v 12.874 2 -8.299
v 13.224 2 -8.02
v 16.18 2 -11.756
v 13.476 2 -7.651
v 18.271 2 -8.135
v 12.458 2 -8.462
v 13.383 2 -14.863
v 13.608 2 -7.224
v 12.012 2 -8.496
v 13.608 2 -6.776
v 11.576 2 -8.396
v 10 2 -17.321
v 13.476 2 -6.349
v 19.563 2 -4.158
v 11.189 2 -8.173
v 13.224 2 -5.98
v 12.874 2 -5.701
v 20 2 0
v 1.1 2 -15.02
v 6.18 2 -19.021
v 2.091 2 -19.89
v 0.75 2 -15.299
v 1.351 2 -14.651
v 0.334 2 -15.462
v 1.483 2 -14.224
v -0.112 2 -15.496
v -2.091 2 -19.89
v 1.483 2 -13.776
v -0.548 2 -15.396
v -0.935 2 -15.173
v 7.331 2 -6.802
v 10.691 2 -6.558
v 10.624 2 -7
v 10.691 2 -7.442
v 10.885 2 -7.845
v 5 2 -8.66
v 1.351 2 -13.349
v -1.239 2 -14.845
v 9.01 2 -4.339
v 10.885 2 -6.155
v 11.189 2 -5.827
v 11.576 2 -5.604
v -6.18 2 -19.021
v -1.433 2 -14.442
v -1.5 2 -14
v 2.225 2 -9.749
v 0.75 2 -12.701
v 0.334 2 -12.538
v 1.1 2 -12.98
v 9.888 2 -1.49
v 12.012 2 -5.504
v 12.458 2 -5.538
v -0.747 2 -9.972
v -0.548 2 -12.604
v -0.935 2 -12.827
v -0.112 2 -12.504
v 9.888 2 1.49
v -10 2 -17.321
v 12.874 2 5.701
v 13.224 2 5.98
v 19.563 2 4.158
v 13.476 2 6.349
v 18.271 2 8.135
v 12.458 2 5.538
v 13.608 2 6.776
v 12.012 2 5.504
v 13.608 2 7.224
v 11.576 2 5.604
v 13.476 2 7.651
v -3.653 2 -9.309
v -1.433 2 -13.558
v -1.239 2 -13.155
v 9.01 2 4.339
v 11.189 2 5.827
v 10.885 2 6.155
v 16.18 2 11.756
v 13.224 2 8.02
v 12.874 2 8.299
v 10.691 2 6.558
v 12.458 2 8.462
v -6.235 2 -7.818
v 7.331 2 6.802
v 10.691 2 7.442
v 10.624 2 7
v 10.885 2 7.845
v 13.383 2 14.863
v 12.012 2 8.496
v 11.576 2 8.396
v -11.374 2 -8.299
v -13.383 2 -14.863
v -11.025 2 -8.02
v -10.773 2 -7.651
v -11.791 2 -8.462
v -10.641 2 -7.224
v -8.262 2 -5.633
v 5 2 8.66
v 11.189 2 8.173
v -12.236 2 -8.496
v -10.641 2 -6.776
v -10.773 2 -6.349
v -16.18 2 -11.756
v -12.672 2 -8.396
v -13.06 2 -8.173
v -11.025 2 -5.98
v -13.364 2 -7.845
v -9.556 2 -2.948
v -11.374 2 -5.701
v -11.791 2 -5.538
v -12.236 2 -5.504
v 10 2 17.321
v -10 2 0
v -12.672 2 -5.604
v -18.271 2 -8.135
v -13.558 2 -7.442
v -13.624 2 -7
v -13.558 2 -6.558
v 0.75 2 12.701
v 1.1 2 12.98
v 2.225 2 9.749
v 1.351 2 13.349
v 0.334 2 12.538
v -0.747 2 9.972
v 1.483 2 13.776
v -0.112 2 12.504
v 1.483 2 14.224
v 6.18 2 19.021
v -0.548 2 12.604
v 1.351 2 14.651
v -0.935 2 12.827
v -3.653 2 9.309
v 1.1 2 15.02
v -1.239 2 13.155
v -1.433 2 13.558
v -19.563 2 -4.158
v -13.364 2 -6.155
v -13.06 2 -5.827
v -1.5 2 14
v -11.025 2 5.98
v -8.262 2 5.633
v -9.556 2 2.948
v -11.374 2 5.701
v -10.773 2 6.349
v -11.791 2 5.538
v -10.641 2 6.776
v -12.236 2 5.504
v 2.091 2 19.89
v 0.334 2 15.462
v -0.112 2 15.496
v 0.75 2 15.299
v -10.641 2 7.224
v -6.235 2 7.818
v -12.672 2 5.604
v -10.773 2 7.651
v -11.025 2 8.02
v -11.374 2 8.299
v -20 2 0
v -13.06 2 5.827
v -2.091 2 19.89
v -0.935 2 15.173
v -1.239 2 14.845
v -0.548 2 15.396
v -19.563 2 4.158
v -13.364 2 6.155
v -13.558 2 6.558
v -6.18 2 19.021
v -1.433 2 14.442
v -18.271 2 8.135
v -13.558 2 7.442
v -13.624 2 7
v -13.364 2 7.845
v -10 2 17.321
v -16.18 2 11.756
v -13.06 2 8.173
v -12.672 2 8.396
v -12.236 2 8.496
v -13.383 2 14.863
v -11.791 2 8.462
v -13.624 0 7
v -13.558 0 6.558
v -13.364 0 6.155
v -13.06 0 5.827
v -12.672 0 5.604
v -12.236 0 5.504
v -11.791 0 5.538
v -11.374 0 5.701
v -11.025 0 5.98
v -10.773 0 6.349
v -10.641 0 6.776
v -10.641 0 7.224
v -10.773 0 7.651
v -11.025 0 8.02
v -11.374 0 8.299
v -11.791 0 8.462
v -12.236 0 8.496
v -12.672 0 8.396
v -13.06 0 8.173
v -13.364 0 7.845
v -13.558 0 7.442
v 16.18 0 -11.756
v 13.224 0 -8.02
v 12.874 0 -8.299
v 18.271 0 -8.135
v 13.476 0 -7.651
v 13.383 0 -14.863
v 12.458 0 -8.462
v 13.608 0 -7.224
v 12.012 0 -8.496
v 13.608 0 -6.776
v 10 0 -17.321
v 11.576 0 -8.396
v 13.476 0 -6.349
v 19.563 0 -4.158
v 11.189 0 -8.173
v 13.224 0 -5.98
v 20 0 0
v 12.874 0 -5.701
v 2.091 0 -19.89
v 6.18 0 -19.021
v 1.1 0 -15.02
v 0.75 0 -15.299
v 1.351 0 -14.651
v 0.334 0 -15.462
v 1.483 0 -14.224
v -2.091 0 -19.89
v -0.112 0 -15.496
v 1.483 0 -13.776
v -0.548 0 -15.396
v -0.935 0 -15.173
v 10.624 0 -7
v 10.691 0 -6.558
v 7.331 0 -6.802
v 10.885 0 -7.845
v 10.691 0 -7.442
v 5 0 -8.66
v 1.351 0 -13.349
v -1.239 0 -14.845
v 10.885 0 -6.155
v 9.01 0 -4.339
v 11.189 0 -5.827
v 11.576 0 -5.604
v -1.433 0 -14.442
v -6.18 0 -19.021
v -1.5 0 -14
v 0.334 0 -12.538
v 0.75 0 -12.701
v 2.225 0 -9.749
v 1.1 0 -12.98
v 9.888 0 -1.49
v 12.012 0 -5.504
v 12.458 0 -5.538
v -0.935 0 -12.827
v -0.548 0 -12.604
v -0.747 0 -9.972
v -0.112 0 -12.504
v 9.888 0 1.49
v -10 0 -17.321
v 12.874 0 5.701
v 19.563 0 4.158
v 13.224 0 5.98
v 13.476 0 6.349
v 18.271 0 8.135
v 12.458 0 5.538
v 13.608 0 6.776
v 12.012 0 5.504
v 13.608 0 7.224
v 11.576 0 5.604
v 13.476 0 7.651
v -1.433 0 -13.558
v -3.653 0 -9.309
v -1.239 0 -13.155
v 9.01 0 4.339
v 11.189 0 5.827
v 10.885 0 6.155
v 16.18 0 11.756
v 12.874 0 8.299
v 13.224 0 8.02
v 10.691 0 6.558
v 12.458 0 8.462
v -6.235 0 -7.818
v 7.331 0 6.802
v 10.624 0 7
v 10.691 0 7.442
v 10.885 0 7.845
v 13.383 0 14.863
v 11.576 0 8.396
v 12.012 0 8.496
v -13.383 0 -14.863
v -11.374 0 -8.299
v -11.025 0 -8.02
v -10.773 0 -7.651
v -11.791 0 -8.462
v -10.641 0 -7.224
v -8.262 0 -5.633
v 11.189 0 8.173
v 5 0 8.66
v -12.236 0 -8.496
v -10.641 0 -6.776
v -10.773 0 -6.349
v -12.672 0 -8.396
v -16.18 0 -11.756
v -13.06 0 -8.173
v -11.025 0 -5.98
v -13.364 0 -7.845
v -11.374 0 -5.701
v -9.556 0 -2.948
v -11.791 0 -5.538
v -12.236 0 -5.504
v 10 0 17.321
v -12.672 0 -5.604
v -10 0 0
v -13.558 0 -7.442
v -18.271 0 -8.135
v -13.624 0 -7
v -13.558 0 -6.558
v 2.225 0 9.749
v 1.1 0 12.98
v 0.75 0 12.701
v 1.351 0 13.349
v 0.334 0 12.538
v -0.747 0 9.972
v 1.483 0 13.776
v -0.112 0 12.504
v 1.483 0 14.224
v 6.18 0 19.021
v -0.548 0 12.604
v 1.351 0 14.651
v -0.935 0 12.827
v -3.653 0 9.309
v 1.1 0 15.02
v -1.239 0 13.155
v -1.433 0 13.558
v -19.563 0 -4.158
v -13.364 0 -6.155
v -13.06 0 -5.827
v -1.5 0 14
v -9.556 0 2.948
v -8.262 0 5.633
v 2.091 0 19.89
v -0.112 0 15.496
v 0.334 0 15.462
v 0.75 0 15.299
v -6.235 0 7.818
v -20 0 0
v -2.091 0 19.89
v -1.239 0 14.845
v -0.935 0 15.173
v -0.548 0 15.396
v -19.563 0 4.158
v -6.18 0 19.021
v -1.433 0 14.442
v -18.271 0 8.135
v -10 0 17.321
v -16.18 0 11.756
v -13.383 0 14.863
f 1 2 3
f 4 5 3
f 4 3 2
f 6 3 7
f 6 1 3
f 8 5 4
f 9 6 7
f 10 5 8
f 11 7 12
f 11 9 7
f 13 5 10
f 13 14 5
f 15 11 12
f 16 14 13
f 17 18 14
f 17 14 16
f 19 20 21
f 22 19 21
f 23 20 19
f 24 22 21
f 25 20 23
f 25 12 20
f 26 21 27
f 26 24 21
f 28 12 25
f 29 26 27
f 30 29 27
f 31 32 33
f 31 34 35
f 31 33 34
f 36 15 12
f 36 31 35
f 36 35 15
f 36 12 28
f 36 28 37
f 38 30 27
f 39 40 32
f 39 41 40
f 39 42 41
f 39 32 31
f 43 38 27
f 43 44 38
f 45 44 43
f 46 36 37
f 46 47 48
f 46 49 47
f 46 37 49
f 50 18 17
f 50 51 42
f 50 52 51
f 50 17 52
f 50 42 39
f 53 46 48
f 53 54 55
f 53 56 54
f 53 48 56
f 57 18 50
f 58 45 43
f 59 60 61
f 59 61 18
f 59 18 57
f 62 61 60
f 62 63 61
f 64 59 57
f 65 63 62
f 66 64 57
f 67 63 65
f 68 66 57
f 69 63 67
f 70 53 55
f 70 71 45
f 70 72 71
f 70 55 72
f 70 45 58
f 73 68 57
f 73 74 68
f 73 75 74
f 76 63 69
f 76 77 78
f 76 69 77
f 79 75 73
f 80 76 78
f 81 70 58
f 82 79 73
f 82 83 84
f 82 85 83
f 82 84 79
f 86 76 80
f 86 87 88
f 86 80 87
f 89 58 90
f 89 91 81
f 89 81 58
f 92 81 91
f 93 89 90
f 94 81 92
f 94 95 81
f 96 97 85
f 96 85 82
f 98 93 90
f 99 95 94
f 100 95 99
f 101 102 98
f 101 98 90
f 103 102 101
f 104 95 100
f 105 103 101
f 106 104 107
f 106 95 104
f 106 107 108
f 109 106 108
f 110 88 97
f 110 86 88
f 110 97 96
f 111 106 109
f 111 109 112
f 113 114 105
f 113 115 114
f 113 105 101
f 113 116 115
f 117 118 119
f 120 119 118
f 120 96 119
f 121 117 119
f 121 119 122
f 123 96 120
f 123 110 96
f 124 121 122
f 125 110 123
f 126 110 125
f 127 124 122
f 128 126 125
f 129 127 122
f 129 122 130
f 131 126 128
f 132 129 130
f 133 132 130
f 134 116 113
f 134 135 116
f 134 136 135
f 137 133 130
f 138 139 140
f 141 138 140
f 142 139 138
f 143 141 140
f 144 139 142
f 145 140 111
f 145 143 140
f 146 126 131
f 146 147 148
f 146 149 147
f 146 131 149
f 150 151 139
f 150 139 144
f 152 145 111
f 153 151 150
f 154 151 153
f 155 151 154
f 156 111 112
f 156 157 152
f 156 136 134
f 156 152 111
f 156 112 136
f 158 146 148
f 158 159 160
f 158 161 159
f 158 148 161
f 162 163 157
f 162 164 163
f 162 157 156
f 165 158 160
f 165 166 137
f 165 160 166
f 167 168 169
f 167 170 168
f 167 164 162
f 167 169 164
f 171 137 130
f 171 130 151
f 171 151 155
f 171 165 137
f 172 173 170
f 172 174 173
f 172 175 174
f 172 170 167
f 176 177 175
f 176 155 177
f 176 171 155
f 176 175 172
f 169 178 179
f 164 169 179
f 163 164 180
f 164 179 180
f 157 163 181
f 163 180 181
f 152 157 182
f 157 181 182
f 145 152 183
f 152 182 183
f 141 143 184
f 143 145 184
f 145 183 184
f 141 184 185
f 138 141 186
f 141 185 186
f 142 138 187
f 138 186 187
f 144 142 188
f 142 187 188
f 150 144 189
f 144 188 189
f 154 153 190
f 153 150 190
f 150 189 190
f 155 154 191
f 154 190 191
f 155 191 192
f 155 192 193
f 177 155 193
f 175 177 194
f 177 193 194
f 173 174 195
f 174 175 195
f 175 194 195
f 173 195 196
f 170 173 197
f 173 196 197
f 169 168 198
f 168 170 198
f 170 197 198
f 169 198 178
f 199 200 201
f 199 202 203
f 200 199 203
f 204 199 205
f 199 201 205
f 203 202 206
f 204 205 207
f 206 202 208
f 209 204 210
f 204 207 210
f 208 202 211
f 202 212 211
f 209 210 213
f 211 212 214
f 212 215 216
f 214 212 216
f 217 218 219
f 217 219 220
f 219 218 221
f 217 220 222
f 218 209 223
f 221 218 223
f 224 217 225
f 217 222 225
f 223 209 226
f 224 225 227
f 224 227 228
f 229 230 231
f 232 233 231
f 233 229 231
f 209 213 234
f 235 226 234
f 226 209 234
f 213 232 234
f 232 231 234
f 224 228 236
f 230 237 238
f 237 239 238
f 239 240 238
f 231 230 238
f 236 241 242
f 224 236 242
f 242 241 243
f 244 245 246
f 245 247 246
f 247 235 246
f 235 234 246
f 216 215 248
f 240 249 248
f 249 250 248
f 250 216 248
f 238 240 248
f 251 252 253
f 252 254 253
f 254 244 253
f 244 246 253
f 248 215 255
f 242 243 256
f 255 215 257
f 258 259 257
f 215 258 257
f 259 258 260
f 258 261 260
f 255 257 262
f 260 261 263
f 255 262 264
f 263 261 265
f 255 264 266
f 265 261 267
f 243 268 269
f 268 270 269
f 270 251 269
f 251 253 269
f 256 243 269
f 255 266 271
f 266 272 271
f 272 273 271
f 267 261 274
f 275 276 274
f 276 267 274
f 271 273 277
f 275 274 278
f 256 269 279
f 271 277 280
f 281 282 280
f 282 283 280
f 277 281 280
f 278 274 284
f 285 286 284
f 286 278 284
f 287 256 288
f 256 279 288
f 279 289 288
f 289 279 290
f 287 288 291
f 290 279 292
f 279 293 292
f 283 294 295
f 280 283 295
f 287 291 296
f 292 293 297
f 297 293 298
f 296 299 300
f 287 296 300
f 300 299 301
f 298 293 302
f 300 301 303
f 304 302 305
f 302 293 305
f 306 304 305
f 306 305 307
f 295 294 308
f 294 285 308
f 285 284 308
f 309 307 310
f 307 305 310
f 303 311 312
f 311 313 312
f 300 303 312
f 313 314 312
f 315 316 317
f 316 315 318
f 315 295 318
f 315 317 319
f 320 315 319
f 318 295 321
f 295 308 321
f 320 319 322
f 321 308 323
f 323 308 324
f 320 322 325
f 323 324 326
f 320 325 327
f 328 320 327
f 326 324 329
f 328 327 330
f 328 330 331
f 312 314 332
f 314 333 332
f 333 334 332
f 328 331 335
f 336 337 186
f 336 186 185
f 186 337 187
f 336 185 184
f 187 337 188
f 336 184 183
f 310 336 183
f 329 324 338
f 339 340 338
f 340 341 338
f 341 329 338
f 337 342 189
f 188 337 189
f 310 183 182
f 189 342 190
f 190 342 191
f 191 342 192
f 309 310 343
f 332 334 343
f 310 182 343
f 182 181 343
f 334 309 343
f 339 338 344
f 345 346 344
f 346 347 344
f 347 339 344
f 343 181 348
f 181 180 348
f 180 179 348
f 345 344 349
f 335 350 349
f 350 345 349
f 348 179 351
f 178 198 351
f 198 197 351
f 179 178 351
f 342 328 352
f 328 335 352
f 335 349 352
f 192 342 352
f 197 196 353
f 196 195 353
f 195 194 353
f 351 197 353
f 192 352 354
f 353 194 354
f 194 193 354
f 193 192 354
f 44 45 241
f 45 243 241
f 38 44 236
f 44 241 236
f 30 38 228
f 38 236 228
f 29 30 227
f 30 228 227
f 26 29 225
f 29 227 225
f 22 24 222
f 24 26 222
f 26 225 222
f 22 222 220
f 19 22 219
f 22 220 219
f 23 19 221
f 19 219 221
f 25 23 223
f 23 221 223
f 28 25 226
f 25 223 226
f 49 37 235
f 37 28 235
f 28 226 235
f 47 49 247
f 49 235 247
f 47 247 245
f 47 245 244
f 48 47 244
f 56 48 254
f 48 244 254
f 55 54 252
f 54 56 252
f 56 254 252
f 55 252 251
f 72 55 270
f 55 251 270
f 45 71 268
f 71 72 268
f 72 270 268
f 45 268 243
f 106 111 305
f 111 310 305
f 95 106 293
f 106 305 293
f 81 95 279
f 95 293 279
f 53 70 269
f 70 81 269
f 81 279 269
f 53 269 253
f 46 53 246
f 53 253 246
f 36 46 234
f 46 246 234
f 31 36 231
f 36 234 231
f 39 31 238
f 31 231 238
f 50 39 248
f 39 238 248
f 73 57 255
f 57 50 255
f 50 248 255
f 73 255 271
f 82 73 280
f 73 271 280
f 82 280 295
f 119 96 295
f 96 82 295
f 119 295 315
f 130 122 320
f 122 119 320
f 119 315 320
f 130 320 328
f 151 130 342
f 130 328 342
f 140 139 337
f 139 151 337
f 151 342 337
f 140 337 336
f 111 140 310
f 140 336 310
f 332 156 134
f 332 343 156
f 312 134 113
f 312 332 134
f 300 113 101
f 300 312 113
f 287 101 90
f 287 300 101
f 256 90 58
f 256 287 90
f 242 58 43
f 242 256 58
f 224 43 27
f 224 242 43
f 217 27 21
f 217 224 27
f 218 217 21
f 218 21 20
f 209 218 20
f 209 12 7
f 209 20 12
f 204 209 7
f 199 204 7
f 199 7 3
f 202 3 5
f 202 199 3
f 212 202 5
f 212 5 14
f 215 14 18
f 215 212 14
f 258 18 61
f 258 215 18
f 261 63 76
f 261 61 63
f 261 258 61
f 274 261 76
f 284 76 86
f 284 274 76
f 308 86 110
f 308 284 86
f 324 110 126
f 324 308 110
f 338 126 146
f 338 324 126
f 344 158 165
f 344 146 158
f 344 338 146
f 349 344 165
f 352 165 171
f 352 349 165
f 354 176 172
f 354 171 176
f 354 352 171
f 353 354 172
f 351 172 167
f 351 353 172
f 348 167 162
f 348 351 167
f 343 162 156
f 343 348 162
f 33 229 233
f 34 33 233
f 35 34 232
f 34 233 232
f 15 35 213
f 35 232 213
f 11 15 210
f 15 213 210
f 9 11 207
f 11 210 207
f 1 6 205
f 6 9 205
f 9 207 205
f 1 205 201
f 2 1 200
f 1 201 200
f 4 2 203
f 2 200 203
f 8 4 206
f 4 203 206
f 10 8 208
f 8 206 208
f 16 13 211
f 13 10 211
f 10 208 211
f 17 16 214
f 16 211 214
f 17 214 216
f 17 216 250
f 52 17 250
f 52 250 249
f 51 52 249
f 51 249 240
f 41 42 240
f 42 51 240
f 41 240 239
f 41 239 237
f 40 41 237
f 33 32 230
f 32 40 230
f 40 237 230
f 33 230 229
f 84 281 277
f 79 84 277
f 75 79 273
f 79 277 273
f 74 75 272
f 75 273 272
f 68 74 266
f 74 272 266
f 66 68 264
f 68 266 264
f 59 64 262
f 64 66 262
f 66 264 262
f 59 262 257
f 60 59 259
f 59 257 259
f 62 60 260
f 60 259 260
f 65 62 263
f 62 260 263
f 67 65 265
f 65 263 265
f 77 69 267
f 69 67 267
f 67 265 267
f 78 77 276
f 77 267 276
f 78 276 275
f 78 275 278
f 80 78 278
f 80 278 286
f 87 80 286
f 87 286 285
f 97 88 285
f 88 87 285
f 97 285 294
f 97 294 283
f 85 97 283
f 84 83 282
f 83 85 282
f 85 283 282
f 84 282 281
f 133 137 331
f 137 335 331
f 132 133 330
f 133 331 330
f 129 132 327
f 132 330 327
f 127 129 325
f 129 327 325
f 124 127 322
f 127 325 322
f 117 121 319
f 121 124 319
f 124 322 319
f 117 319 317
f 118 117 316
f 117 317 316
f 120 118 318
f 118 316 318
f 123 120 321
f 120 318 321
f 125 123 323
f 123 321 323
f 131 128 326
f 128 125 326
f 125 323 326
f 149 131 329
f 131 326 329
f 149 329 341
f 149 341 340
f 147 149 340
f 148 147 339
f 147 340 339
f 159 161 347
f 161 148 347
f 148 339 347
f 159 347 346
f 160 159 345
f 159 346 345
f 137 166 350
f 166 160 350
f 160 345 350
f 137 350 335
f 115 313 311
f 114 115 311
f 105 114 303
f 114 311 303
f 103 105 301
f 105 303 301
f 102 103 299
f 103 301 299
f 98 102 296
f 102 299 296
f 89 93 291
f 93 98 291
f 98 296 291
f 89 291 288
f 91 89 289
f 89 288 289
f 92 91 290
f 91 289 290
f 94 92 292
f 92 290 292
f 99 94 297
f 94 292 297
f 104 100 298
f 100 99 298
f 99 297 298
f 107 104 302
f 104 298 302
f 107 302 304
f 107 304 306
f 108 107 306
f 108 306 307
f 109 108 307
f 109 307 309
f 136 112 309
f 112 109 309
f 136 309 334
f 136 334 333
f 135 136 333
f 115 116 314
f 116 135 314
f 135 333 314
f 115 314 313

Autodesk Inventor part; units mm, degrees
ref_plane "YZ Plane" through (0, 0, 0) normal (1, 0, 0) x (0, 1, 0)
ref_plane "XZ Plane" through (0, 0, 0) normal (0, 1, 0) x (-1, 0, 0)
ref_plane "XY Plane" through (0, 0, 0) normal (0, 0, 1) x (1, 0, 0)
sketch "Эскиз1" plane through (0, 0, 0) normal (0, 1, 0) x (-1, 0, 0)
  circle A0 centre (0, 0) radius 20
  circle A1 centre (0, 0) radius 10
  circle A2 centre (0, -14) radius 1.5
  circle A3 centre (12.1244, -7) radius 1.5
  circle A4 centre (12.1244, 7) radius 1.5
  circle A5 centre (0, 14) radius 1.5
  circle A6 centre (-12.1244, 7) radius 1.5
  circle A7 centre (-12.1244, -7) radius 1.5
  dimension "d0" = 40
  dimension "d1" = 20
  dimension "d2" = 14
  dimension "d3" = 3
  dimension "d6" = 360
extrude "Выдавливание1" add sketch "Эскиз1" along normal blind 2
properties part number "btnring"
